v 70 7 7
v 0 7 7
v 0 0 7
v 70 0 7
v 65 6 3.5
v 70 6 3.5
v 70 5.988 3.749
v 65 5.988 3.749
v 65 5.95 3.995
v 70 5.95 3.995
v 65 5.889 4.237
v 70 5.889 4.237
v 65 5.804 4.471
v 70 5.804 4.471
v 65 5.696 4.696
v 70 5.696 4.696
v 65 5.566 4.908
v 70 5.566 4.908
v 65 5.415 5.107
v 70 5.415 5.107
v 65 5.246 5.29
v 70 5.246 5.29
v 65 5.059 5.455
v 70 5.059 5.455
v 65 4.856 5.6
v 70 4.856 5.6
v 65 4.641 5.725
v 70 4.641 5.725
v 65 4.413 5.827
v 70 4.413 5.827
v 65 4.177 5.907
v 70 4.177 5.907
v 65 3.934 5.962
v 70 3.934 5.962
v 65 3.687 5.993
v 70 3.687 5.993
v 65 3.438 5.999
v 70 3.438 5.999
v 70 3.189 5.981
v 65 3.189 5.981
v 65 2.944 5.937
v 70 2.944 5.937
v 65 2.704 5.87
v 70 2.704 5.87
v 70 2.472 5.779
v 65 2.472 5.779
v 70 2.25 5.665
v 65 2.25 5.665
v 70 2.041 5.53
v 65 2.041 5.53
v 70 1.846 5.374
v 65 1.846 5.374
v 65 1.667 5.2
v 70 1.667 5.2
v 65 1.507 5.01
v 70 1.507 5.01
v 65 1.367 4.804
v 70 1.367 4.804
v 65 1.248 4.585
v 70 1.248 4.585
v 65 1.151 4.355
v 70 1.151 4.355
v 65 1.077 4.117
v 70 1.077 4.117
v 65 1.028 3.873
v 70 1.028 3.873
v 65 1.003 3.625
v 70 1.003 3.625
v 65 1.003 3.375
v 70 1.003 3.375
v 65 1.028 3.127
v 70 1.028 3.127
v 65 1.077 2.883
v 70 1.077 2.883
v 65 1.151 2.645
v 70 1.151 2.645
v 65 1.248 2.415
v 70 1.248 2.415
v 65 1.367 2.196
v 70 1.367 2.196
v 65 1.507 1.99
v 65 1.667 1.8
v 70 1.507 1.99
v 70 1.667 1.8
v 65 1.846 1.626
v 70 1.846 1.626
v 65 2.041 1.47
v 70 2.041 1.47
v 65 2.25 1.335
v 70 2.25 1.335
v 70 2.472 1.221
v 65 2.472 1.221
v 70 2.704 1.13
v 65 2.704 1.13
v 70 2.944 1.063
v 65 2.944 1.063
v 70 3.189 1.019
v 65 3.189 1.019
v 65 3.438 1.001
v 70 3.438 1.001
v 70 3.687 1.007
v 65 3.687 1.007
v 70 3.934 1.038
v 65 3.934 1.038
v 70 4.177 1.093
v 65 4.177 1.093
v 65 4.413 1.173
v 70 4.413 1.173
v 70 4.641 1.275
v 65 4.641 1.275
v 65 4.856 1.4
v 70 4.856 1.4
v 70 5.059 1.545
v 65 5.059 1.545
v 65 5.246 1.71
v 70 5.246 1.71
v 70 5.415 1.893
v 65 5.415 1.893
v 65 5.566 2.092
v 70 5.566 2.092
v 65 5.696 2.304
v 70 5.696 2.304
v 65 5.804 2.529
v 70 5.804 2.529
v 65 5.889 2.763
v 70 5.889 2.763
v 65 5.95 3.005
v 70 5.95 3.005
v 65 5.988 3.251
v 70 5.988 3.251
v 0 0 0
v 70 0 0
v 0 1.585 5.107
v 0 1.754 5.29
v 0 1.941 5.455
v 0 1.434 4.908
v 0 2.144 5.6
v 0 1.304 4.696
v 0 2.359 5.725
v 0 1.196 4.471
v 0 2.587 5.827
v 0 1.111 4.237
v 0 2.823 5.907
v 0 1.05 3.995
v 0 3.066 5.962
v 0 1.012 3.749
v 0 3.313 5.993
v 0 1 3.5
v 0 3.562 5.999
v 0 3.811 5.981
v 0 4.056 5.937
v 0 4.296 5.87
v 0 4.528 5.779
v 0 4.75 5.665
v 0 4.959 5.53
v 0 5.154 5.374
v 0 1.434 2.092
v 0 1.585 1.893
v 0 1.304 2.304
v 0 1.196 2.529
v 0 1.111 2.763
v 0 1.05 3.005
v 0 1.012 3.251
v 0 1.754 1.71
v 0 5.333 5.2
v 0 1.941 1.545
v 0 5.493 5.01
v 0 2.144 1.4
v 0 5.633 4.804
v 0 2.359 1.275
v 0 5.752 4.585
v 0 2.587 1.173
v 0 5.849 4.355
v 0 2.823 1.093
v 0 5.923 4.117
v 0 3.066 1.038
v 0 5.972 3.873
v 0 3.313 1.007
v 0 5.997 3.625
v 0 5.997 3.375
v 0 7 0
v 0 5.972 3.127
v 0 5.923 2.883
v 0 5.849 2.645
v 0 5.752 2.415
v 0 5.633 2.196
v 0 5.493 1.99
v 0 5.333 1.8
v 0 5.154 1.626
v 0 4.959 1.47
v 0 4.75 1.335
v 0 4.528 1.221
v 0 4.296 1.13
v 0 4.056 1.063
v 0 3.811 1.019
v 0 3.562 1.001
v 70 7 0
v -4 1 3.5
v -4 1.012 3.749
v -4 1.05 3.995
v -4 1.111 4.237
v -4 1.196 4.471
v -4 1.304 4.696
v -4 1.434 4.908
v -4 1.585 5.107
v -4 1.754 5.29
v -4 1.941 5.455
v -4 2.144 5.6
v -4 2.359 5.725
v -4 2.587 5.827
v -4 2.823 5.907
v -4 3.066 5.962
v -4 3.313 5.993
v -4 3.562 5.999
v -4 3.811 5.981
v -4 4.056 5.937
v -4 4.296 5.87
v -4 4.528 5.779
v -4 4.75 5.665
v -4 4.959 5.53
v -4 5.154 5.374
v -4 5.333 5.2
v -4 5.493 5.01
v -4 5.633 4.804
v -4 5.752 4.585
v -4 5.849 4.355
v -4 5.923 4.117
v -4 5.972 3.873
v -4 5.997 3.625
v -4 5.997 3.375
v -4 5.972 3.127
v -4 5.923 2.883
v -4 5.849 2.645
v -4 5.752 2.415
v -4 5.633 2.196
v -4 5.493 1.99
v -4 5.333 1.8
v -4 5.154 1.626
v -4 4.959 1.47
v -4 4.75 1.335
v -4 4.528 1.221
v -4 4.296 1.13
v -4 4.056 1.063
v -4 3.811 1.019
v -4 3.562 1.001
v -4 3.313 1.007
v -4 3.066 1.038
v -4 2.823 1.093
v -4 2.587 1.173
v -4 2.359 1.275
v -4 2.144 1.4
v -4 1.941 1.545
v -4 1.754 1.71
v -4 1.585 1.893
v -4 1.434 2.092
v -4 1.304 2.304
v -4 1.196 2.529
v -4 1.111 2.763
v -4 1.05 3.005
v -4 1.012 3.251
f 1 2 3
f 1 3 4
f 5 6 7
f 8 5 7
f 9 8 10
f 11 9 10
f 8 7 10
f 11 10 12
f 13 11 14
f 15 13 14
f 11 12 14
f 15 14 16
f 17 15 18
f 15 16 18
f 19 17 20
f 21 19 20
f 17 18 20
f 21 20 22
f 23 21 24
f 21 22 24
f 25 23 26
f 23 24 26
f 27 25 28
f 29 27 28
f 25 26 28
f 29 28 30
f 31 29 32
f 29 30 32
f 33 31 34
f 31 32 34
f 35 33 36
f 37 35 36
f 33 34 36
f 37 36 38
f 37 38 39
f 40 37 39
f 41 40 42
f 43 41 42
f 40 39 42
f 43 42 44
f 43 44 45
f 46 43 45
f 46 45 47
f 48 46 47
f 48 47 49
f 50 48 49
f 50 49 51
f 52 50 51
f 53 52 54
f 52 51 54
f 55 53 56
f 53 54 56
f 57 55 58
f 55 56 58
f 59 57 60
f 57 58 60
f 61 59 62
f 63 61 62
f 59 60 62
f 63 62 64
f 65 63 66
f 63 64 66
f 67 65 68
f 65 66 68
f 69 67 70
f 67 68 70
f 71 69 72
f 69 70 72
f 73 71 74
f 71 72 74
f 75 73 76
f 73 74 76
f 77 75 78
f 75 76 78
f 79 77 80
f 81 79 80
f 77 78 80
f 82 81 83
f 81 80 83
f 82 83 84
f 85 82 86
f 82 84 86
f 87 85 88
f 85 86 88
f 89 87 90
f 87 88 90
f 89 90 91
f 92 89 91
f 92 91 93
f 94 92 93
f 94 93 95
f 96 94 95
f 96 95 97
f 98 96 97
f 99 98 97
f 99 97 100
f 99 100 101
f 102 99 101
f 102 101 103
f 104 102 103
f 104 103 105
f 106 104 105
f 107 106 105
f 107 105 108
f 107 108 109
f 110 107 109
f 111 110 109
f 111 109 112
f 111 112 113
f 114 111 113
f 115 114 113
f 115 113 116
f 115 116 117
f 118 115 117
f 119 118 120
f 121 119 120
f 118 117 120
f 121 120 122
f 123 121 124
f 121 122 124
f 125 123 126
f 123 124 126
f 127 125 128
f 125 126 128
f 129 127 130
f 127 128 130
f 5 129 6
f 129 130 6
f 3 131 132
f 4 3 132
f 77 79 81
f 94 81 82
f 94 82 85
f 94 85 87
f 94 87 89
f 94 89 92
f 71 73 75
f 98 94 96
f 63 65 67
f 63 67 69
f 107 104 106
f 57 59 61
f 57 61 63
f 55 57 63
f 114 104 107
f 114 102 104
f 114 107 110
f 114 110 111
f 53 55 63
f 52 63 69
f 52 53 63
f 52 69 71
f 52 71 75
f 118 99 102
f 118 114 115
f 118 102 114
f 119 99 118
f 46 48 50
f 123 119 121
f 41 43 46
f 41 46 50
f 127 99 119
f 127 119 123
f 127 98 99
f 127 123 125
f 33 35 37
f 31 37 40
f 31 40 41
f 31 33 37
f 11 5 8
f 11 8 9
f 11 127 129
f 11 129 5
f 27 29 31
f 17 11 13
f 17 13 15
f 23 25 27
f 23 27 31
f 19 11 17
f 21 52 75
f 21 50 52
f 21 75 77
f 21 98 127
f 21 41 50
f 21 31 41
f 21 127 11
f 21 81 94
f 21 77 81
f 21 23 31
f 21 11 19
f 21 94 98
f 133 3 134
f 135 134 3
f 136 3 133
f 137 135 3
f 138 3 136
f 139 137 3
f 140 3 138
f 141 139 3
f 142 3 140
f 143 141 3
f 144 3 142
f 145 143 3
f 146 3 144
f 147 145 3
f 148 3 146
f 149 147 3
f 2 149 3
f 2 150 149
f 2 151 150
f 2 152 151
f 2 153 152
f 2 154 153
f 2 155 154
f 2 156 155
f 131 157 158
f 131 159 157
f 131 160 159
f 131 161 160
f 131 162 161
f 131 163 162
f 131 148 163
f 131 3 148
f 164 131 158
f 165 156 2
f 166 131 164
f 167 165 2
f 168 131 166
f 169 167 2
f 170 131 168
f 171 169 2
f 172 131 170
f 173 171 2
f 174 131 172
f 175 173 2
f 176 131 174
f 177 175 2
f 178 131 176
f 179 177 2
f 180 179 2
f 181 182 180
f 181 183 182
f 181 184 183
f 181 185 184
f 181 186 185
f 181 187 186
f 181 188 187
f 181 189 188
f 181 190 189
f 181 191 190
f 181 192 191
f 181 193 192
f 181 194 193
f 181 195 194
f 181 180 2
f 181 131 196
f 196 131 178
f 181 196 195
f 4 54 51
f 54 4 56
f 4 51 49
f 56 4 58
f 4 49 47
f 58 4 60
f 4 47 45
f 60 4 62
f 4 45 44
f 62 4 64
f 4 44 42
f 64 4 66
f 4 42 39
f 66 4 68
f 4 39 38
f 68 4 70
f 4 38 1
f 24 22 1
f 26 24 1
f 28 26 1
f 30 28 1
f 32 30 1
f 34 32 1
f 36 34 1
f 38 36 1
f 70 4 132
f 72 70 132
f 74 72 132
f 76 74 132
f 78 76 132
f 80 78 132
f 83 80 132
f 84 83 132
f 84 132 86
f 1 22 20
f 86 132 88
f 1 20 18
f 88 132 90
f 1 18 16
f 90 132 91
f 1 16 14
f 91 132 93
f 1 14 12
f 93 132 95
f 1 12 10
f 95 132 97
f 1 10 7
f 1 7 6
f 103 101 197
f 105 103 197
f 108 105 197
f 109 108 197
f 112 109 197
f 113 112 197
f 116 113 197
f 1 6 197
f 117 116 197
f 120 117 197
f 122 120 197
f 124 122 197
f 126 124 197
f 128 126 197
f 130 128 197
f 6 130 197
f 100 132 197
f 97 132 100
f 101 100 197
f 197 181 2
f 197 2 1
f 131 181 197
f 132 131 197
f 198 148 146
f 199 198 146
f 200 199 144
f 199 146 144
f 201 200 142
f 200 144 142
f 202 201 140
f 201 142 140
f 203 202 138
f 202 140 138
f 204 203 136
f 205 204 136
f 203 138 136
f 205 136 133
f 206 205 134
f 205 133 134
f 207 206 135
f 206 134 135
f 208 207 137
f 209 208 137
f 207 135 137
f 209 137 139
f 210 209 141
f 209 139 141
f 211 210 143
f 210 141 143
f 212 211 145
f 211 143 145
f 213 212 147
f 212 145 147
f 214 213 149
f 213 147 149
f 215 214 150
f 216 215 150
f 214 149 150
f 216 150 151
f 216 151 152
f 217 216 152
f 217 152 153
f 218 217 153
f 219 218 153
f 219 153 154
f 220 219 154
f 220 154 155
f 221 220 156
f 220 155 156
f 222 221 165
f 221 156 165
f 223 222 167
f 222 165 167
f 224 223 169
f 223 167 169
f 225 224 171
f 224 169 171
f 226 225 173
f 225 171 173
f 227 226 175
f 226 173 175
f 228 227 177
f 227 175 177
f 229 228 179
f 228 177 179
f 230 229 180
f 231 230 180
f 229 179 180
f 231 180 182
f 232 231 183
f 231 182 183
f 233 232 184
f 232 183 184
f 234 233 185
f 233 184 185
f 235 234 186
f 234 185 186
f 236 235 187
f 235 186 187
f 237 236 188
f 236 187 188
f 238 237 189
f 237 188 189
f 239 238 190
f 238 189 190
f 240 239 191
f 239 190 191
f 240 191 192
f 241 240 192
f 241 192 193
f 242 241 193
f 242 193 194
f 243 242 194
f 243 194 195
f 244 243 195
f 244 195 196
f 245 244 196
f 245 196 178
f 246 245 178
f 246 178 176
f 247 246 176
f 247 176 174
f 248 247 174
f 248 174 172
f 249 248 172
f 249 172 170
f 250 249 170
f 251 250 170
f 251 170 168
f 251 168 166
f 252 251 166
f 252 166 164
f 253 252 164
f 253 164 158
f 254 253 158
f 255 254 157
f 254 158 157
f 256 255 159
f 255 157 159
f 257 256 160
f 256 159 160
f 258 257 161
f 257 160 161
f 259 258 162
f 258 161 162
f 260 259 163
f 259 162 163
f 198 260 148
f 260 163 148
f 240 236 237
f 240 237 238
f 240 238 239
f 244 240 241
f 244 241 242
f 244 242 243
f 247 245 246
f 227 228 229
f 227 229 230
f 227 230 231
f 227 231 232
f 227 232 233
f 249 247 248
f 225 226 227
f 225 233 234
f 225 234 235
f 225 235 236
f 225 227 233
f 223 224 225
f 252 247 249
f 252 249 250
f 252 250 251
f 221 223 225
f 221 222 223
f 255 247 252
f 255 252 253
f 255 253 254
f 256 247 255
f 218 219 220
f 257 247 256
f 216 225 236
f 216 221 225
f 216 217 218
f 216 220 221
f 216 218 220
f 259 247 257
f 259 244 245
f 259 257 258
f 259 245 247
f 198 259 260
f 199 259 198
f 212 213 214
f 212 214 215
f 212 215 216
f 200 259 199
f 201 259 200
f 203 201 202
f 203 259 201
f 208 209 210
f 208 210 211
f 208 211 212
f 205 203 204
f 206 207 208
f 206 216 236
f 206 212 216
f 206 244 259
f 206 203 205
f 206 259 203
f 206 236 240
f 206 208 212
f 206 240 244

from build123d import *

# Parameters (mm, degrees)
F0_W     = 70
F0_H     = 7
F1_DEPTH = 7
F2_R     = 2.5
F3_DEPTH = 5
F4_R     = 2.5
F5_DEPTH = 4


with BuildPart() as f1:
    # F0 (on Top) → F1 (new body)
    with BuildSketch(Plane.XY):
        with Locations((35, 3.5)):
            Rectangle(F0_W, F0_H)
    extrude(amount=F1_DEPTH)

    # F2 (on face) → F3 (cut)
    with BuildSketch(Plane.YZ.offset(70)):
        with Locations((3.5, 3.5)):
            Circle(F2_R)
    extrude(amount=-F3_DEPTH, mode=Mode.SUBTRACT)

    # F4 (on face) → F5 (join)
    with BuildSketch(Plane(origin=(0, 0, 0), x_dir=(0, -1, 0), z_dir=(-1, 0, 0))):
        with Locations((-3.5, 3.5)):
            Circle(F4_R)
    extrude(amount=F5_DEPTH)


solid = f1.part
